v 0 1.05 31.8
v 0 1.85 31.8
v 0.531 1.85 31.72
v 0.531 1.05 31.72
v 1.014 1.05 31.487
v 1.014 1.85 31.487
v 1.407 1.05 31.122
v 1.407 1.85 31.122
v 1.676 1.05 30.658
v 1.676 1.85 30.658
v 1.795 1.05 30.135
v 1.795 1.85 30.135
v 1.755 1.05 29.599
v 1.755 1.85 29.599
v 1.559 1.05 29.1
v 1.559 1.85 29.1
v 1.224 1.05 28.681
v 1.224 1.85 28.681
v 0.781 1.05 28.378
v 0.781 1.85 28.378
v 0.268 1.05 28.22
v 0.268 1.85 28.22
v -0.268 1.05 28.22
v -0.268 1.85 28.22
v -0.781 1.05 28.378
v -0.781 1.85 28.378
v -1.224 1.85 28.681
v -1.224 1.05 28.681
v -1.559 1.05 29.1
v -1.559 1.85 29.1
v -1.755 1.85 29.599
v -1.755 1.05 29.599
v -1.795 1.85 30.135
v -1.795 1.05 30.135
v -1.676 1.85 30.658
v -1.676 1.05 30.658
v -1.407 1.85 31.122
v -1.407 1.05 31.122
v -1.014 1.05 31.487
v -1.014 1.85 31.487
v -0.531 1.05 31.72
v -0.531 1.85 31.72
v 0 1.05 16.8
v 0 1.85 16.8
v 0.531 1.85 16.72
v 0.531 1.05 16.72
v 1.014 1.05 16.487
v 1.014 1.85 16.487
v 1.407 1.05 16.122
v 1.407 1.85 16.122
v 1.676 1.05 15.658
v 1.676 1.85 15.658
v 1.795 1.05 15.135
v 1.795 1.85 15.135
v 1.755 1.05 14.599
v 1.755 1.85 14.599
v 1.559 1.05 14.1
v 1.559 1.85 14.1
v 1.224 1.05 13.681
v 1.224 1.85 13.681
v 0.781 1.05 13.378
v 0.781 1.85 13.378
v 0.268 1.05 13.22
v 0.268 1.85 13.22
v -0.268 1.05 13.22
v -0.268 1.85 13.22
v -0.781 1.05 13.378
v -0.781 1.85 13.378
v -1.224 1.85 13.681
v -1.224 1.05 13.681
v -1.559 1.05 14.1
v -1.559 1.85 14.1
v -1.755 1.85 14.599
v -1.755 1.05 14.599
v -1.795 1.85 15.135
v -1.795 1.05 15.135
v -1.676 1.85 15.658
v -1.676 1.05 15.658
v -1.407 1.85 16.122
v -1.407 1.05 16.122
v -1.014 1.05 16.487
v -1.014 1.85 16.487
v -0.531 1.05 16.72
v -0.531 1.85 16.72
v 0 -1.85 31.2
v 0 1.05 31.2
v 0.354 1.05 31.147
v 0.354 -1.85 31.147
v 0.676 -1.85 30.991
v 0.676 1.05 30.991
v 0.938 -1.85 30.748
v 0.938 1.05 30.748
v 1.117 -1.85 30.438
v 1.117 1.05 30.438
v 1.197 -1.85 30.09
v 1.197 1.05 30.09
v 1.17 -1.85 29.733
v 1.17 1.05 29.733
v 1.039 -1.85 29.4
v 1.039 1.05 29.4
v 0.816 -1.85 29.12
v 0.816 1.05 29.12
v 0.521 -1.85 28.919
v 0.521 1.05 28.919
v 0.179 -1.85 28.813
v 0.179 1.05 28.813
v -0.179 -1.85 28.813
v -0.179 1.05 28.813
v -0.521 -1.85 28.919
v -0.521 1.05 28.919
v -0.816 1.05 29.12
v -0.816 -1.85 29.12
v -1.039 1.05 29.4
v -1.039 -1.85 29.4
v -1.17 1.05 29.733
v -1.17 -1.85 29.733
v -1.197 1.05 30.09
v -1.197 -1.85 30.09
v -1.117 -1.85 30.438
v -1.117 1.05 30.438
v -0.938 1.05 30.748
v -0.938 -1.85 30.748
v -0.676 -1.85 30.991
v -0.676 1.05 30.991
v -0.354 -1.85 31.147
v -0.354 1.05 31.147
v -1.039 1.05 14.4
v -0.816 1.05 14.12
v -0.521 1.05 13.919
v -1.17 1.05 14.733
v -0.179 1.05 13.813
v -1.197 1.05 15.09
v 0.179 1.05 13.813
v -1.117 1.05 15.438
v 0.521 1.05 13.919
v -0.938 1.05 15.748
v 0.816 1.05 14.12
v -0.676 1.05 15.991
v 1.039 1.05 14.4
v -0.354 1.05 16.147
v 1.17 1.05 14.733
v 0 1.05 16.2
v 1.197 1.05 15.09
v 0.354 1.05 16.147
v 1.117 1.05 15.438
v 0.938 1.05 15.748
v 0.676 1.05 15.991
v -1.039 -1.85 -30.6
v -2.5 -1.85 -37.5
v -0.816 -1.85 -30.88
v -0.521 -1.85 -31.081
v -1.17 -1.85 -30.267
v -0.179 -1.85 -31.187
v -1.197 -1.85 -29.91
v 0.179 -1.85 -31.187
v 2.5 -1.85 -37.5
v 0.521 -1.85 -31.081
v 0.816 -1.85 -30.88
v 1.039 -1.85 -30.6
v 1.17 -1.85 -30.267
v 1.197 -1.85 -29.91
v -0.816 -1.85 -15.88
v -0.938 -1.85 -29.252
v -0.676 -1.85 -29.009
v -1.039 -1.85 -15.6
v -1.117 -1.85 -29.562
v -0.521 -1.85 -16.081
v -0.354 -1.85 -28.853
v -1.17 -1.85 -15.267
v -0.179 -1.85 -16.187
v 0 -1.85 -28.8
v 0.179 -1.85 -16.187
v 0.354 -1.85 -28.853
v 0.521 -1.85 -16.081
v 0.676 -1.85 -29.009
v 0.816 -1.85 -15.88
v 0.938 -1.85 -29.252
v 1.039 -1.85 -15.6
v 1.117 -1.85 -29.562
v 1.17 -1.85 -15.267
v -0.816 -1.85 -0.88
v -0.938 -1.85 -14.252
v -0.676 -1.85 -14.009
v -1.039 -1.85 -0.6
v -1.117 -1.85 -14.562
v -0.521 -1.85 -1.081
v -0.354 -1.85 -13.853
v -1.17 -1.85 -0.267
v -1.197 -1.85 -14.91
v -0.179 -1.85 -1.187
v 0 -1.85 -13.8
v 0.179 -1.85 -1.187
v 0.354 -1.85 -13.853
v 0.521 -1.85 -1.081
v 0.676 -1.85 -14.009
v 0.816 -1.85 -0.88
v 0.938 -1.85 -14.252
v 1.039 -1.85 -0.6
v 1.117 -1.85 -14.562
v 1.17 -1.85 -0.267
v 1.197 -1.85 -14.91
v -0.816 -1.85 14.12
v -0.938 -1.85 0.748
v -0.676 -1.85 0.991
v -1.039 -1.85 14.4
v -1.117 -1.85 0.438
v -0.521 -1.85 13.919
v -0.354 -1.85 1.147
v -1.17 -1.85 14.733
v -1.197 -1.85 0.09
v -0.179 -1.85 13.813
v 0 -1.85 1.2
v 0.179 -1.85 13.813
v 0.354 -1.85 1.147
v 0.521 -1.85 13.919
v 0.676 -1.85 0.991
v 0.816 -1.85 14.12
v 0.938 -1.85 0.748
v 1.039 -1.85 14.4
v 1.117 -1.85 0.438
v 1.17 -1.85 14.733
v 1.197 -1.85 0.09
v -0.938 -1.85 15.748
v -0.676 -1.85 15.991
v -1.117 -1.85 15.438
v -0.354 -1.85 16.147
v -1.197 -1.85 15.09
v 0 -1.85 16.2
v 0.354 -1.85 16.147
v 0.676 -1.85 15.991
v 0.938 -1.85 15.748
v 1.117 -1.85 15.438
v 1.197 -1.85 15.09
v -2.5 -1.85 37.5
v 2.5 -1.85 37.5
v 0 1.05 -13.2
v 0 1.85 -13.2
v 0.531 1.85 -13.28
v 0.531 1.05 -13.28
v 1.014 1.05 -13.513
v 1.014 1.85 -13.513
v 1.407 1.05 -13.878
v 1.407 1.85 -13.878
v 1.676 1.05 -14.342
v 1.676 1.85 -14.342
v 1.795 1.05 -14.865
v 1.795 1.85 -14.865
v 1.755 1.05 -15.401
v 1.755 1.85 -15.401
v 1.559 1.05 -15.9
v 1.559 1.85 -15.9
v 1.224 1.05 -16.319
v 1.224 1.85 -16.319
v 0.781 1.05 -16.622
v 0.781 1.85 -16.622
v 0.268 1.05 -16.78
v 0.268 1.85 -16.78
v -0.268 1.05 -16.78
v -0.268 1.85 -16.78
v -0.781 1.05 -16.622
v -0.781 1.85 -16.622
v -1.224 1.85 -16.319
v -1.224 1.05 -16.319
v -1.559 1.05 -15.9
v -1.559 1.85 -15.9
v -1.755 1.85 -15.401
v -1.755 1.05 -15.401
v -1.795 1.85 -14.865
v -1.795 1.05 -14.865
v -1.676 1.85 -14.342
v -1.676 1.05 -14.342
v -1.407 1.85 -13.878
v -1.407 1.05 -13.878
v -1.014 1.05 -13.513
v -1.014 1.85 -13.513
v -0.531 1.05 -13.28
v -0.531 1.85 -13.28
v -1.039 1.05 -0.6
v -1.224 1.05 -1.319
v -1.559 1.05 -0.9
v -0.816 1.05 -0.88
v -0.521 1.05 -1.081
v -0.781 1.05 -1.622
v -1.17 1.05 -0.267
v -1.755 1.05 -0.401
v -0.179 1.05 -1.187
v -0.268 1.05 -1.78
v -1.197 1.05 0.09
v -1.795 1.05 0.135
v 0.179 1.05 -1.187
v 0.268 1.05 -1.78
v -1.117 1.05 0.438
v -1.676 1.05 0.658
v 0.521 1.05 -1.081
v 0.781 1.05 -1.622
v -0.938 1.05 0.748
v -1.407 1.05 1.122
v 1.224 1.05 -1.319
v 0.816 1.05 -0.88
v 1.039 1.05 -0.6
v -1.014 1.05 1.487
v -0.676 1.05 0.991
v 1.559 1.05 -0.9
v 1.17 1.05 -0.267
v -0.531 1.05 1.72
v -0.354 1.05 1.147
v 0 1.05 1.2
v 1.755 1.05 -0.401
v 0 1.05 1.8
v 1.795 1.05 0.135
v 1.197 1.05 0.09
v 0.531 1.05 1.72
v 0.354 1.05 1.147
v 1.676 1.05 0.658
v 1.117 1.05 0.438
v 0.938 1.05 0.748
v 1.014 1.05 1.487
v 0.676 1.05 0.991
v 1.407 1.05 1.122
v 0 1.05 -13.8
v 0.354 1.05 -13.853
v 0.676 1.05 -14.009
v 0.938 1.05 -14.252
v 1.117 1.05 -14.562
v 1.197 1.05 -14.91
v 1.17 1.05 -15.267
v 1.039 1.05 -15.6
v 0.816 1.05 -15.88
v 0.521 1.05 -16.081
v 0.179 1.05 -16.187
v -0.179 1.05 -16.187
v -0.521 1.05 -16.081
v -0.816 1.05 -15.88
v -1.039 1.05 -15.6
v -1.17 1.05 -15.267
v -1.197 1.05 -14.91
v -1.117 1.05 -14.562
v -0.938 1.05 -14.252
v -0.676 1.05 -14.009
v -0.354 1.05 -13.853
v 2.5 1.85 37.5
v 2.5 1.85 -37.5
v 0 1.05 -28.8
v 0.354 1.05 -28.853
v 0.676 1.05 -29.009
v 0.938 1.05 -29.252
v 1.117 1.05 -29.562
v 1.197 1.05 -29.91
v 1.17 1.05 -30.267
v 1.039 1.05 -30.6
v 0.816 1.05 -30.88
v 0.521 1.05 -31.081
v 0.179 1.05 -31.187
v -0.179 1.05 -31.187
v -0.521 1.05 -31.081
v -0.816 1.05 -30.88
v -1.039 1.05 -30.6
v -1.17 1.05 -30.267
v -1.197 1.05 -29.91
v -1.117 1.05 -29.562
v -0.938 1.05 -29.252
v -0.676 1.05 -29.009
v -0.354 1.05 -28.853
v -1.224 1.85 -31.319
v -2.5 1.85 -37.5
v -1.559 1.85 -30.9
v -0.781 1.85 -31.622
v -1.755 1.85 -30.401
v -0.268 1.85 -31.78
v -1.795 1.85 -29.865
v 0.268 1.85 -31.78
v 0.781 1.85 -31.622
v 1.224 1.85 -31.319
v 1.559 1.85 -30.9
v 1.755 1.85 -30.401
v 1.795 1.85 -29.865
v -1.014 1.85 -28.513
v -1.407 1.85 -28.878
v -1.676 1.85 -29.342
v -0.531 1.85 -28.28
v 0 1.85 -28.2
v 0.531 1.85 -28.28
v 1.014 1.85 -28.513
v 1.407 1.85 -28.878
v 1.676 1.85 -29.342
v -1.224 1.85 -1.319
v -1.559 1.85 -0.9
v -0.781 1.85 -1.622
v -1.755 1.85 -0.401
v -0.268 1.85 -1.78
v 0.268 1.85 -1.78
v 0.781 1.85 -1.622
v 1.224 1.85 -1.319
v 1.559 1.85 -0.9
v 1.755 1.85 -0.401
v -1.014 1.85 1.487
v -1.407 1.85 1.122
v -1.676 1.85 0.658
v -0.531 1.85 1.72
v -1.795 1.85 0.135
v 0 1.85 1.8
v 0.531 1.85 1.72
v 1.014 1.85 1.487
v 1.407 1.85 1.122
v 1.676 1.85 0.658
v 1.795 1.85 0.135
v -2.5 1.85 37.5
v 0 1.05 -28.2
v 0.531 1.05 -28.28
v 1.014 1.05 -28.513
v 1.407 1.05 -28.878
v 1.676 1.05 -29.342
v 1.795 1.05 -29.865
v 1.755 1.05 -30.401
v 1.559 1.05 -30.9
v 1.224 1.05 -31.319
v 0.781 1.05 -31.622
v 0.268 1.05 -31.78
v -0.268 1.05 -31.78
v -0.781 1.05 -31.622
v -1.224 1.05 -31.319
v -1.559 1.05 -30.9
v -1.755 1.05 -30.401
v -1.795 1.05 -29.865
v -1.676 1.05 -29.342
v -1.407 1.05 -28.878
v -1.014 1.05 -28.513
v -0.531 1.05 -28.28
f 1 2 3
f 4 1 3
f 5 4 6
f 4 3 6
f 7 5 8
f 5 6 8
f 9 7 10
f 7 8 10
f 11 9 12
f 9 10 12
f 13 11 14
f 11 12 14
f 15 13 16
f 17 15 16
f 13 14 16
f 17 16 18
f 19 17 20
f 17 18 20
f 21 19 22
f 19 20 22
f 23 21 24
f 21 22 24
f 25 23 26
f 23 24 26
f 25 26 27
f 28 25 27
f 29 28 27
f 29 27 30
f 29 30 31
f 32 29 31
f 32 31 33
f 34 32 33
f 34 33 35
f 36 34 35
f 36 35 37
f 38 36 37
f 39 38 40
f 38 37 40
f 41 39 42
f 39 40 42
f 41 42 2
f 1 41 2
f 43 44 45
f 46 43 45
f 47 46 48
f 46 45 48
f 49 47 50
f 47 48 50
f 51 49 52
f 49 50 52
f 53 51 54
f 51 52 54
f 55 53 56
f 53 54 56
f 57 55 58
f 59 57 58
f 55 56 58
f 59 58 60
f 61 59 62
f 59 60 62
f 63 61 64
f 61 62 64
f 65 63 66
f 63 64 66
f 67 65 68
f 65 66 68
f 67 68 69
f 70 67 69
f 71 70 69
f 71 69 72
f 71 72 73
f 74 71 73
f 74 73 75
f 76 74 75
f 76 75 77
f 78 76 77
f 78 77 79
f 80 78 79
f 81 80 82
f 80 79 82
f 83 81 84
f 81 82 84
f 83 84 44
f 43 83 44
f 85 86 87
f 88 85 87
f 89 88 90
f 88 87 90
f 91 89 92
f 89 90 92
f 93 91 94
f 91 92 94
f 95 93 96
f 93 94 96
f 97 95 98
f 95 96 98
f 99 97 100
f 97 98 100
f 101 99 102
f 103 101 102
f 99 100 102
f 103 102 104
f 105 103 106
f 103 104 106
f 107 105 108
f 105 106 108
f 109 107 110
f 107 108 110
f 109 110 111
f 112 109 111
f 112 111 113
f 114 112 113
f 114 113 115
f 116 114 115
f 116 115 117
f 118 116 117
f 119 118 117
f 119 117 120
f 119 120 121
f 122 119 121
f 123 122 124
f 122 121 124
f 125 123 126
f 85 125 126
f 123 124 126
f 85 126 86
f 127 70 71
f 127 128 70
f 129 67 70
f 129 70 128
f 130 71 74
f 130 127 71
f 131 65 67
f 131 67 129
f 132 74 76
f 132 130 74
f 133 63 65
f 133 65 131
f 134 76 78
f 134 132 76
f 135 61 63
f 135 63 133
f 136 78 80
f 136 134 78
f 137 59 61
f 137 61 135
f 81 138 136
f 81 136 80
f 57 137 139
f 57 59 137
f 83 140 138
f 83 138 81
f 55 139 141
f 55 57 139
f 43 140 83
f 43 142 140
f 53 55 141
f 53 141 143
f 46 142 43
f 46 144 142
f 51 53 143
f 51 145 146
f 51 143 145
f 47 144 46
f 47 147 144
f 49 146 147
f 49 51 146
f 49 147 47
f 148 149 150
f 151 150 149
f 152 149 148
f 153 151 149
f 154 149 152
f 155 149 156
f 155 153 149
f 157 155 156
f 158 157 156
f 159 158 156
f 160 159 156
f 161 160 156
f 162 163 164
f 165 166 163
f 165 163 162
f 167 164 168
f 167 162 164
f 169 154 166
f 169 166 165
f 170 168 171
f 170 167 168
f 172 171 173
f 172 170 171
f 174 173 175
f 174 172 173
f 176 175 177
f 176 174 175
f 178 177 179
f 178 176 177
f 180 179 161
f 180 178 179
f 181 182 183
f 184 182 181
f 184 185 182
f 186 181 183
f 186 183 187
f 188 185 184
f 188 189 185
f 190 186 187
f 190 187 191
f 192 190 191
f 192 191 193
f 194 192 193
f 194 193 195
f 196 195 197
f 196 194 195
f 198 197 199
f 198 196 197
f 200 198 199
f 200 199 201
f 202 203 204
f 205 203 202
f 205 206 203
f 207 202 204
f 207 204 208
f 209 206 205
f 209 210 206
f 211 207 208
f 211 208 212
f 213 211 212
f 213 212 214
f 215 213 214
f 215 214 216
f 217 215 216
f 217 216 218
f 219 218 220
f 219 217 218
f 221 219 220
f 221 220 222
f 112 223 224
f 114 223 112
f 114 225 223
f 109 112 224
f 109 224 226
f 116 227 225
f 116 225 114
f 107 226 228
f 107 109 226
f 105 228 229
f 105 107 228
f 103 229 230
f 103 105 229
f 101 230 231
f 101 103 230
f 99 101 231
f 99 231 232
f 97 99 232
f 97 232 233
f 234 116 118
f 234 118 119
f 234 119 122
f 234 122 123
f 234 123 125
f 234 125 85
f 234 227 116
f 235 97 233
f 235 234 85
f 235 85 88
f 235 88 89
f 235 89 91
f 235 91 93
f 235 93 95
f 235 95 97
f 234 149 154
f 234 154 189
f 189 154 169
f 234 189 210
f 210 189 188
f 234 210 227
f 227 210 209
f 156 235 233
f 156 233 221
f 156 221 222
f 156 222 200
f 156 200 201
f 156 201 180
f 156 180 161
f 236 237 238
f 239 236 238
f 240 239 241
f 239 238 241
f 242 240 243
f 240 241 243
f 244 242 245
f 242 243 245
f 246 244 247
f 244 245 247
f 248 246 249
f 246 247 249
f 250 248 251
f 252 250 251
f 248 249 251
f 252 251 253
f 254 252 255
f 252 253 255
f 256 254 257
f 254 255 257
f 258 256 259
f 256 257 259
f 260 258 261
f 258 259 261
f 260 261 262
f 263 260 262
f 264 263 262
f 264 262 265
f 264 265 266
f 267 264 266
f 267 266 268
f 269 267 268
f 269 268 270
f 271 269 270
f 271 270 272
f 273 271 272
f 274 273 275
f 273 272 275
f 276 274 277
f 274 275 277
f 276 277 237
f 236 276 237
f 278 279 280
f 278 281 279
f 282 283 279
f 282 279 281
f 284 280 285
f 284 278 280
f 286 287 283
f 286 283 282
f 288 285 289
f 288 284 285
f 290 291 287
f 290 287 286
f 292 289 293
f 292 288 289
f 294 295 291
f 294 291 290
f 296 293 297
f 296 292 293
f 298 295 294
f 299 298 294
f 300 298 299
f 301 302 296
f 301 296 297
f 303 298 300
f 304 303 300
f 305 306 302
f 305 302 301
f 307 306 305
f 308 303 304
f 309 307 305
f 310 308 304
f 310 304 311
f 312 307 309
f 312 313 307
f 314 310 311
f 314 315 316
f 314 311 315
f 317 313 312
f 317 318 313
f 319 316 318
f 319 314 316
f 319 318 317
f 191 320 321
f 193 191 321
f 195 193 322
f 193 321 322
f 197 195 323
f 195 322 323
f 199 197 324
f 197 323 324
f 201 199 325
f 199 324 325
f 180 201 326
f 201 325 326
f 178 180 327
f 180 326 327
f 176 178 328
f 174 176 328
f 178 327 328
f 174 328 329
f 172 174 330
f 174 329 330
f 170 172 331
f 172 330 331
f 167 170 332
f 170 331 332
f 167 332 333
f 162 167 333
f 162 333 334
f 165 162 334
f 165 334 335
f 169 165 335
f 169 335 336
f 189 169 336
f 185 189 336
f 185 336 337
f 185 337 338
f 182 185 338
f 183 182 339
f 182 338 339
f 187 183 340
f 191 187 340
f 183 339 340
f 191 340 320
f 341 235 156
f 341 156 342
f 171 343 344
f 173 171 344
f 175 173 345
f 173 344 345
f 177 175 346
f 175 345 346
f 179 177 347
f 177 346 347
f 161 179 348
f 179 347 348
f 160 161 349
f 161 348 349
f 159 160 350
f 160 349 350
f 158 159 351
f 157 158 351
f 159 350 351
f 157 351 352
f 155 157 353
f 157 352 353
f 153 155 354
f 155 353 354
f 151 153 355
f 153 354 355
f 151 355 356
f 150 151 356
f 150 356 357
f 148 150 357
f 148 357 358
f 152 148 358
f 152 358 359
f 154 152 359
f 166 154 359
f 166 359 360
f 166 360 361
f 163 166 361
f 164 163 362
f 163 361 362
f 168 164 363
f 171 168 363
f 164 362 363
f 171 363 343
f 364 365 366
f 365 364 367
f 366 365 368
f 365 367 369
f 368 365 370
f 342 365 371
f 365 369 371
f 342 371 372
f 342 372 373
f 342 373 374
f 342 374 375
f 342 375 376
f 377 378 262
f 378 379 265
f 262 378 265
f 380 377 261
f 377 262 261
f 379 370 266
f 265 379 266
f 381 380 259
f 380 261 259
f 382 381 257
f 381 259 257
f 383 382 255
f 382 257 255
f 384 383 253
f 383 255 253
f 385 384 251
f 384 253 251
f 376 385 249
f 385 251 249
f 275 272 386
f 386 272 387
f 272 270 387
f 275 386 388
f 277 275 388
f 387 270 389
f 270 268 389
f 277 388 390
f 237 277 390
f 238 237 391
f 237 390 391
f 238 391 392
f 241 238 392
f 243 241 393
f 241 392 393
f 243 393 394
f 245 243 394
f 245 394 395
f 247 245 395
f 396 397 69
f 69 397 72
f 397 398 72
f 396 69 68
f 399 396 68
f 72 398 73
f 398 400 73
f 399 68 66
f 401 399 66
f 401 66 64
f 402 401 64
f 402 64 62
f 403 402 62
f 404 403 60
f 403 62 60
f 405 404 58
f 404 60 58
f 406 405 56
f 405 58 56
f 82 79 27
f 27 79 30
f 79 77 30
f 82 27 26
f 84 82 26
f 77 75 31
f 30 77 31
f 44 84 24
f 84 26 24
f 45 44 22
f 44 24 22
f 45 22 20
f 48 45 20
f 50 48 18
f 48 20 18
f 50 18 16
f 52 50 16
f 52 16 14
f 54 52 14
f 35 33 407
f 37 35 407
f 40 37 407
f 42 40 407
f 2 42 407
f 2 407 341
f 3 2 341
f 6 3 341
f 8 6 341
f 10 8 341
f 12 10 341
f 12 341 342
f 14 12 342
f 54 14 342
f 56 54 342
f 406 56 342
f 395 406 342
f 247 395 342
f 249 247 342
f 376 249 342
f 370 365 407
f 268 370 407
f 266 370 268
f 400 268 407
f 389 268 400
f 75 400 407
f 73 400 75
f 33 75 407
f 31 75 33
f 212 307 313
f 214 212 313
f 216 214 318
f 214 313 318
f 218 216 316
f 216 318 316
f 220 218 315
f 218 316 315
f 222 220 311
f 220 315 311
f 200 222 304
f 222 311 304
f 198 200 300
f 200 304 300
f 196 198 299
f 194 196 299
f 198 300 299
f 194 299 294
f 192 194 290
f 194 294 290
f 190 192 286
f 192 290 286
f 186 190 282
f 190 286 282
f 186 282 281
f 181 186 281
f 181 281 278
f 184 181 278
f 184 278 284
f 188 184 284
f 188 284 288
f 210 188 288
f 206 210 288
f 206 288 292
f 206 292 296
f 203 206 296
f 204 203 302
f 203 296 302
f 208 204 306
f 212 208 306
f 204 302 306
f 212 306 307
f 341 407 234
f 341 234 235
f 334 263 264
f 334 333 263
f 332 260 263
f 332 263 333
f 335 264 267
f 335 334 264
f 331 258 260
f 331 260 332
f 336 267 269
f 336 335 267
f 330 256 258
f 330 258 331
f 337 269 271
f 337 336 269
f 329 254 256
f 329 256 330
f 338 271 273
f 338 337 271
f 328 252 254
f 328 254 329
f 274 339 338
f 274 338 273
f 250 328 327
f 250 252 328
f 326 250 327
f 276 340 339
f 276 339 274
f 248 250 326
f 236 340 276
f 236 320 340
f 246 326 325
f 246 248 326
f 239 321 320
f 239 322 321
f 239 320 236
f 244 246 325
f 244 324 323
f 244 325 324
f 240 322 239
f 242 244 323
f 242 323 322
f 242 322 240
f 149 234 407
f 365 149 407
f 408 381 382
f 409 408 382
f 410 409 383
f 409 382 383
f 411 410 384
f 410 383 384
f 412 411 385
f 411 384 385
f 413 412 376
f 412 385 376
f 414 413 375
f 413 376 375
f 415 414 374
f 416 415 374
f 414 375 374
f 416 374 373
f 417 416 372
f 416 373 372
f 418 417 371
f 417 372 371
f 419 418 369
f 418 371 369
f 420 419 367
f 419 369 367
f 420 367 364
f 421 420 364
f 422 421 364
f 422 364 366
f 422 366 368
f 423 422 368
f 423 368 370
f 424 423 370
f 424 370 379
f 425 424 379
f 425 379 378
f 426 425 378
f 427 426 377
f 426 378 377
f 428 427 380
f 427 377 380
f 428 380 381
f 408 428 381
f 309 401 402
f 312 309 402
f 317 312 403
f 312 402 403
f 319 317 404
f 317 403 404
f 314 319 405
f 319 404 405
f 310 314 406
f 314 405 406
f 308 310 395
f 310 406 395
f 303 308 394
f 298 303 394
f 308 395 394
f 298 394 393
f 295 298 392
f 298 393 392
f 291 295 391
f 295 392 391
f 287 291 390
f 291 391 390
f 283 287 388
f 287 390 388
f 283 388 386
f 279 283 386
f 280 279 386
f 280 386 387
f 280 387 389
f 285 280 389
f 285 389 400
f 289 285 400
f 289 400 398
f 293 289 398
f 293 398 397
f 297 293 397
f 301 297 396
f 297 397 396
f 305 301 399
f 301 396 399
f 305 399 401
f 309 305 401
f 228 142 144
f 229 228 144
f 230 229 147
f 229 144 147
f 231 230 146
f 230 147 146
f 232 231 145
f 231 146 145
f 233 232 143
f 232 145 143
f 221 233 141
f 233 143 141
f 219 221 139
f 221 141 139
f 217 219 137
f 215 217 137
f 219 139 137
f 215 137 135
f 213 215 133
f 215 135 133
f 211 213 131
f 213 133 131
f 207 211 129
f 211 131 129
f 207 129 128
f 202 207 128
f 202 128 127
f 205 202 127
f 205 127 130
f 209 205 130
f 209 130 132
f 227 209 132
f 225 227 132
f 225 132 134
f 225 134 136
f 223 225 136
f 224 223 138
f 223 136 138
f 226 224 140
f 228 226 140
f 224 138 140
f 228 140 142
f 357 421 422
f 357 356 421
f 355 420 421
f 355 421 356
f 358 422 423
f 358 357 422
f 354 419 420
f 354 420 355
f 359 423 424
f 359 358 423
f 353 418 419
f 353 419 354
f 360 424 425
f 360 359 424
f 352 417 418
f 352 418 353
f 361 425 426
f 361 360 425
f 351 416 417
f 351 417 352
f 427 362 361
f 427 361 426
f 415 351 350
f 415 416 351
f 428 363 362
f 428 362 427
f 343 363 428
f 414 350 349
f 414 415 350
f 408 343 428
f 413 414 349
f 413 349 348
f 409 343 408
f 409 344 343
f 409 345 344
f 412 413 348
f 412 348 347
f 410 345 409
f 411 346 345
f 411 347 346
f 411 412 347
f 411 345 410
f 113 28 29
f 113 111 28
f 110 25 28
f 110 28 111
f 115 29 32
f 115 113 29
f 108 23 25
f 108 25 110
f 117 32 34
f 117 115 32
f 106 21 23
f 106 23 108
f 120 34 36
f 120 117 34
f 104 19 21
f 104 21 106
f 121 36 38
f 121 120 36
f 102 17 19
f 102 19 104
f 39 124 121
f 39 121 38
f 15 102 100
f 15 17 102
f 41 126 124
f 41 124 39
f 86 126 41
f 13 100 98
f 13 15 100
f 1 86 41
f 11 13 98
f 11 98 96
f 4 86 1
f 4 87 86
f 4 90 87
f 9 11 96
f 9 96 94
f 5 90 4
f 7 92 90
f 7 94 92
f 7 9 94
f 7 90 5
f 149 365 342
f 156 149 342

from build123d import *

# Parameters (mm, degrees)
SKETCH_1_W             = 5
SKETCH_1_H             = 3.7
EXTRUDE_1_DEPTH        = 37.5
SKETCH_2_R             = 1.2
CUT_EXTRUDE_1_DEPTH    = 3010.5
SKETCH_3_R             = 1.8
CUT_EXTRUDE_2_DEPTH    = 0.8
PATTERN_LINEAR_1_COUNT = 5
PATTERN_LINEAR_1_PITCH = 15


with BuildPart() as part:
    # 草图1 → 凸台-拉伸1 (new, symmetric)
    with BuildSketch(Plane.XY):
        Rectangle(SKETCH_1_W, SKETCH_1_H)
    extrude(amount=EXTRUDE_1_DEPTH, both=True)

    # 草图2 → 切除-拉伸1 (cut, symmetric)
    with BuildSketch(Plane(origin=(0, 1.85, 0), x_dir=(1, 0, 0), z_dir=(0, 1, 0))):
        with Locations(Location((0, -30, 0), (0, 0, 270))):
            Circle(SKETCH_2_R)
    cut_extrude_1 = extrude(amount=CUT_EXTRUDE_1_DEPTH, both=True, mode=Mode.SUBTRACT)

    # 草图3 → 切除-拉伸2 (cut)
    with BuildSketch(Plane(origin=(0, 1.85, 0), x_dir=(1, 0, 0), z_dir=(0, 1, 0))):
        with Locations(Location((0, -30, 0), (0, 0, 270))):
            Circle(SKETCH_3_R)
    cut_extrude_2 = extrude(amount=-CUT_EXTRUDE_2_DEPTH, mode=Mode.SUBTRACT)

    # 阵列(线性)1: 切除-拉伸1, 切除-拉伸2 ×5
    with Locations(*[(0, 0, -i * PATTERN_LINEAR_1_PITCH) for i in range(1, PATTERN_LINEAR_1_COUNT)]):
        add(cut_extrude_1, mode=Mode.SUBTRACT)
        add(cut_extrude_2, mode=Mode.SUBTRACT)


solid = part.part
